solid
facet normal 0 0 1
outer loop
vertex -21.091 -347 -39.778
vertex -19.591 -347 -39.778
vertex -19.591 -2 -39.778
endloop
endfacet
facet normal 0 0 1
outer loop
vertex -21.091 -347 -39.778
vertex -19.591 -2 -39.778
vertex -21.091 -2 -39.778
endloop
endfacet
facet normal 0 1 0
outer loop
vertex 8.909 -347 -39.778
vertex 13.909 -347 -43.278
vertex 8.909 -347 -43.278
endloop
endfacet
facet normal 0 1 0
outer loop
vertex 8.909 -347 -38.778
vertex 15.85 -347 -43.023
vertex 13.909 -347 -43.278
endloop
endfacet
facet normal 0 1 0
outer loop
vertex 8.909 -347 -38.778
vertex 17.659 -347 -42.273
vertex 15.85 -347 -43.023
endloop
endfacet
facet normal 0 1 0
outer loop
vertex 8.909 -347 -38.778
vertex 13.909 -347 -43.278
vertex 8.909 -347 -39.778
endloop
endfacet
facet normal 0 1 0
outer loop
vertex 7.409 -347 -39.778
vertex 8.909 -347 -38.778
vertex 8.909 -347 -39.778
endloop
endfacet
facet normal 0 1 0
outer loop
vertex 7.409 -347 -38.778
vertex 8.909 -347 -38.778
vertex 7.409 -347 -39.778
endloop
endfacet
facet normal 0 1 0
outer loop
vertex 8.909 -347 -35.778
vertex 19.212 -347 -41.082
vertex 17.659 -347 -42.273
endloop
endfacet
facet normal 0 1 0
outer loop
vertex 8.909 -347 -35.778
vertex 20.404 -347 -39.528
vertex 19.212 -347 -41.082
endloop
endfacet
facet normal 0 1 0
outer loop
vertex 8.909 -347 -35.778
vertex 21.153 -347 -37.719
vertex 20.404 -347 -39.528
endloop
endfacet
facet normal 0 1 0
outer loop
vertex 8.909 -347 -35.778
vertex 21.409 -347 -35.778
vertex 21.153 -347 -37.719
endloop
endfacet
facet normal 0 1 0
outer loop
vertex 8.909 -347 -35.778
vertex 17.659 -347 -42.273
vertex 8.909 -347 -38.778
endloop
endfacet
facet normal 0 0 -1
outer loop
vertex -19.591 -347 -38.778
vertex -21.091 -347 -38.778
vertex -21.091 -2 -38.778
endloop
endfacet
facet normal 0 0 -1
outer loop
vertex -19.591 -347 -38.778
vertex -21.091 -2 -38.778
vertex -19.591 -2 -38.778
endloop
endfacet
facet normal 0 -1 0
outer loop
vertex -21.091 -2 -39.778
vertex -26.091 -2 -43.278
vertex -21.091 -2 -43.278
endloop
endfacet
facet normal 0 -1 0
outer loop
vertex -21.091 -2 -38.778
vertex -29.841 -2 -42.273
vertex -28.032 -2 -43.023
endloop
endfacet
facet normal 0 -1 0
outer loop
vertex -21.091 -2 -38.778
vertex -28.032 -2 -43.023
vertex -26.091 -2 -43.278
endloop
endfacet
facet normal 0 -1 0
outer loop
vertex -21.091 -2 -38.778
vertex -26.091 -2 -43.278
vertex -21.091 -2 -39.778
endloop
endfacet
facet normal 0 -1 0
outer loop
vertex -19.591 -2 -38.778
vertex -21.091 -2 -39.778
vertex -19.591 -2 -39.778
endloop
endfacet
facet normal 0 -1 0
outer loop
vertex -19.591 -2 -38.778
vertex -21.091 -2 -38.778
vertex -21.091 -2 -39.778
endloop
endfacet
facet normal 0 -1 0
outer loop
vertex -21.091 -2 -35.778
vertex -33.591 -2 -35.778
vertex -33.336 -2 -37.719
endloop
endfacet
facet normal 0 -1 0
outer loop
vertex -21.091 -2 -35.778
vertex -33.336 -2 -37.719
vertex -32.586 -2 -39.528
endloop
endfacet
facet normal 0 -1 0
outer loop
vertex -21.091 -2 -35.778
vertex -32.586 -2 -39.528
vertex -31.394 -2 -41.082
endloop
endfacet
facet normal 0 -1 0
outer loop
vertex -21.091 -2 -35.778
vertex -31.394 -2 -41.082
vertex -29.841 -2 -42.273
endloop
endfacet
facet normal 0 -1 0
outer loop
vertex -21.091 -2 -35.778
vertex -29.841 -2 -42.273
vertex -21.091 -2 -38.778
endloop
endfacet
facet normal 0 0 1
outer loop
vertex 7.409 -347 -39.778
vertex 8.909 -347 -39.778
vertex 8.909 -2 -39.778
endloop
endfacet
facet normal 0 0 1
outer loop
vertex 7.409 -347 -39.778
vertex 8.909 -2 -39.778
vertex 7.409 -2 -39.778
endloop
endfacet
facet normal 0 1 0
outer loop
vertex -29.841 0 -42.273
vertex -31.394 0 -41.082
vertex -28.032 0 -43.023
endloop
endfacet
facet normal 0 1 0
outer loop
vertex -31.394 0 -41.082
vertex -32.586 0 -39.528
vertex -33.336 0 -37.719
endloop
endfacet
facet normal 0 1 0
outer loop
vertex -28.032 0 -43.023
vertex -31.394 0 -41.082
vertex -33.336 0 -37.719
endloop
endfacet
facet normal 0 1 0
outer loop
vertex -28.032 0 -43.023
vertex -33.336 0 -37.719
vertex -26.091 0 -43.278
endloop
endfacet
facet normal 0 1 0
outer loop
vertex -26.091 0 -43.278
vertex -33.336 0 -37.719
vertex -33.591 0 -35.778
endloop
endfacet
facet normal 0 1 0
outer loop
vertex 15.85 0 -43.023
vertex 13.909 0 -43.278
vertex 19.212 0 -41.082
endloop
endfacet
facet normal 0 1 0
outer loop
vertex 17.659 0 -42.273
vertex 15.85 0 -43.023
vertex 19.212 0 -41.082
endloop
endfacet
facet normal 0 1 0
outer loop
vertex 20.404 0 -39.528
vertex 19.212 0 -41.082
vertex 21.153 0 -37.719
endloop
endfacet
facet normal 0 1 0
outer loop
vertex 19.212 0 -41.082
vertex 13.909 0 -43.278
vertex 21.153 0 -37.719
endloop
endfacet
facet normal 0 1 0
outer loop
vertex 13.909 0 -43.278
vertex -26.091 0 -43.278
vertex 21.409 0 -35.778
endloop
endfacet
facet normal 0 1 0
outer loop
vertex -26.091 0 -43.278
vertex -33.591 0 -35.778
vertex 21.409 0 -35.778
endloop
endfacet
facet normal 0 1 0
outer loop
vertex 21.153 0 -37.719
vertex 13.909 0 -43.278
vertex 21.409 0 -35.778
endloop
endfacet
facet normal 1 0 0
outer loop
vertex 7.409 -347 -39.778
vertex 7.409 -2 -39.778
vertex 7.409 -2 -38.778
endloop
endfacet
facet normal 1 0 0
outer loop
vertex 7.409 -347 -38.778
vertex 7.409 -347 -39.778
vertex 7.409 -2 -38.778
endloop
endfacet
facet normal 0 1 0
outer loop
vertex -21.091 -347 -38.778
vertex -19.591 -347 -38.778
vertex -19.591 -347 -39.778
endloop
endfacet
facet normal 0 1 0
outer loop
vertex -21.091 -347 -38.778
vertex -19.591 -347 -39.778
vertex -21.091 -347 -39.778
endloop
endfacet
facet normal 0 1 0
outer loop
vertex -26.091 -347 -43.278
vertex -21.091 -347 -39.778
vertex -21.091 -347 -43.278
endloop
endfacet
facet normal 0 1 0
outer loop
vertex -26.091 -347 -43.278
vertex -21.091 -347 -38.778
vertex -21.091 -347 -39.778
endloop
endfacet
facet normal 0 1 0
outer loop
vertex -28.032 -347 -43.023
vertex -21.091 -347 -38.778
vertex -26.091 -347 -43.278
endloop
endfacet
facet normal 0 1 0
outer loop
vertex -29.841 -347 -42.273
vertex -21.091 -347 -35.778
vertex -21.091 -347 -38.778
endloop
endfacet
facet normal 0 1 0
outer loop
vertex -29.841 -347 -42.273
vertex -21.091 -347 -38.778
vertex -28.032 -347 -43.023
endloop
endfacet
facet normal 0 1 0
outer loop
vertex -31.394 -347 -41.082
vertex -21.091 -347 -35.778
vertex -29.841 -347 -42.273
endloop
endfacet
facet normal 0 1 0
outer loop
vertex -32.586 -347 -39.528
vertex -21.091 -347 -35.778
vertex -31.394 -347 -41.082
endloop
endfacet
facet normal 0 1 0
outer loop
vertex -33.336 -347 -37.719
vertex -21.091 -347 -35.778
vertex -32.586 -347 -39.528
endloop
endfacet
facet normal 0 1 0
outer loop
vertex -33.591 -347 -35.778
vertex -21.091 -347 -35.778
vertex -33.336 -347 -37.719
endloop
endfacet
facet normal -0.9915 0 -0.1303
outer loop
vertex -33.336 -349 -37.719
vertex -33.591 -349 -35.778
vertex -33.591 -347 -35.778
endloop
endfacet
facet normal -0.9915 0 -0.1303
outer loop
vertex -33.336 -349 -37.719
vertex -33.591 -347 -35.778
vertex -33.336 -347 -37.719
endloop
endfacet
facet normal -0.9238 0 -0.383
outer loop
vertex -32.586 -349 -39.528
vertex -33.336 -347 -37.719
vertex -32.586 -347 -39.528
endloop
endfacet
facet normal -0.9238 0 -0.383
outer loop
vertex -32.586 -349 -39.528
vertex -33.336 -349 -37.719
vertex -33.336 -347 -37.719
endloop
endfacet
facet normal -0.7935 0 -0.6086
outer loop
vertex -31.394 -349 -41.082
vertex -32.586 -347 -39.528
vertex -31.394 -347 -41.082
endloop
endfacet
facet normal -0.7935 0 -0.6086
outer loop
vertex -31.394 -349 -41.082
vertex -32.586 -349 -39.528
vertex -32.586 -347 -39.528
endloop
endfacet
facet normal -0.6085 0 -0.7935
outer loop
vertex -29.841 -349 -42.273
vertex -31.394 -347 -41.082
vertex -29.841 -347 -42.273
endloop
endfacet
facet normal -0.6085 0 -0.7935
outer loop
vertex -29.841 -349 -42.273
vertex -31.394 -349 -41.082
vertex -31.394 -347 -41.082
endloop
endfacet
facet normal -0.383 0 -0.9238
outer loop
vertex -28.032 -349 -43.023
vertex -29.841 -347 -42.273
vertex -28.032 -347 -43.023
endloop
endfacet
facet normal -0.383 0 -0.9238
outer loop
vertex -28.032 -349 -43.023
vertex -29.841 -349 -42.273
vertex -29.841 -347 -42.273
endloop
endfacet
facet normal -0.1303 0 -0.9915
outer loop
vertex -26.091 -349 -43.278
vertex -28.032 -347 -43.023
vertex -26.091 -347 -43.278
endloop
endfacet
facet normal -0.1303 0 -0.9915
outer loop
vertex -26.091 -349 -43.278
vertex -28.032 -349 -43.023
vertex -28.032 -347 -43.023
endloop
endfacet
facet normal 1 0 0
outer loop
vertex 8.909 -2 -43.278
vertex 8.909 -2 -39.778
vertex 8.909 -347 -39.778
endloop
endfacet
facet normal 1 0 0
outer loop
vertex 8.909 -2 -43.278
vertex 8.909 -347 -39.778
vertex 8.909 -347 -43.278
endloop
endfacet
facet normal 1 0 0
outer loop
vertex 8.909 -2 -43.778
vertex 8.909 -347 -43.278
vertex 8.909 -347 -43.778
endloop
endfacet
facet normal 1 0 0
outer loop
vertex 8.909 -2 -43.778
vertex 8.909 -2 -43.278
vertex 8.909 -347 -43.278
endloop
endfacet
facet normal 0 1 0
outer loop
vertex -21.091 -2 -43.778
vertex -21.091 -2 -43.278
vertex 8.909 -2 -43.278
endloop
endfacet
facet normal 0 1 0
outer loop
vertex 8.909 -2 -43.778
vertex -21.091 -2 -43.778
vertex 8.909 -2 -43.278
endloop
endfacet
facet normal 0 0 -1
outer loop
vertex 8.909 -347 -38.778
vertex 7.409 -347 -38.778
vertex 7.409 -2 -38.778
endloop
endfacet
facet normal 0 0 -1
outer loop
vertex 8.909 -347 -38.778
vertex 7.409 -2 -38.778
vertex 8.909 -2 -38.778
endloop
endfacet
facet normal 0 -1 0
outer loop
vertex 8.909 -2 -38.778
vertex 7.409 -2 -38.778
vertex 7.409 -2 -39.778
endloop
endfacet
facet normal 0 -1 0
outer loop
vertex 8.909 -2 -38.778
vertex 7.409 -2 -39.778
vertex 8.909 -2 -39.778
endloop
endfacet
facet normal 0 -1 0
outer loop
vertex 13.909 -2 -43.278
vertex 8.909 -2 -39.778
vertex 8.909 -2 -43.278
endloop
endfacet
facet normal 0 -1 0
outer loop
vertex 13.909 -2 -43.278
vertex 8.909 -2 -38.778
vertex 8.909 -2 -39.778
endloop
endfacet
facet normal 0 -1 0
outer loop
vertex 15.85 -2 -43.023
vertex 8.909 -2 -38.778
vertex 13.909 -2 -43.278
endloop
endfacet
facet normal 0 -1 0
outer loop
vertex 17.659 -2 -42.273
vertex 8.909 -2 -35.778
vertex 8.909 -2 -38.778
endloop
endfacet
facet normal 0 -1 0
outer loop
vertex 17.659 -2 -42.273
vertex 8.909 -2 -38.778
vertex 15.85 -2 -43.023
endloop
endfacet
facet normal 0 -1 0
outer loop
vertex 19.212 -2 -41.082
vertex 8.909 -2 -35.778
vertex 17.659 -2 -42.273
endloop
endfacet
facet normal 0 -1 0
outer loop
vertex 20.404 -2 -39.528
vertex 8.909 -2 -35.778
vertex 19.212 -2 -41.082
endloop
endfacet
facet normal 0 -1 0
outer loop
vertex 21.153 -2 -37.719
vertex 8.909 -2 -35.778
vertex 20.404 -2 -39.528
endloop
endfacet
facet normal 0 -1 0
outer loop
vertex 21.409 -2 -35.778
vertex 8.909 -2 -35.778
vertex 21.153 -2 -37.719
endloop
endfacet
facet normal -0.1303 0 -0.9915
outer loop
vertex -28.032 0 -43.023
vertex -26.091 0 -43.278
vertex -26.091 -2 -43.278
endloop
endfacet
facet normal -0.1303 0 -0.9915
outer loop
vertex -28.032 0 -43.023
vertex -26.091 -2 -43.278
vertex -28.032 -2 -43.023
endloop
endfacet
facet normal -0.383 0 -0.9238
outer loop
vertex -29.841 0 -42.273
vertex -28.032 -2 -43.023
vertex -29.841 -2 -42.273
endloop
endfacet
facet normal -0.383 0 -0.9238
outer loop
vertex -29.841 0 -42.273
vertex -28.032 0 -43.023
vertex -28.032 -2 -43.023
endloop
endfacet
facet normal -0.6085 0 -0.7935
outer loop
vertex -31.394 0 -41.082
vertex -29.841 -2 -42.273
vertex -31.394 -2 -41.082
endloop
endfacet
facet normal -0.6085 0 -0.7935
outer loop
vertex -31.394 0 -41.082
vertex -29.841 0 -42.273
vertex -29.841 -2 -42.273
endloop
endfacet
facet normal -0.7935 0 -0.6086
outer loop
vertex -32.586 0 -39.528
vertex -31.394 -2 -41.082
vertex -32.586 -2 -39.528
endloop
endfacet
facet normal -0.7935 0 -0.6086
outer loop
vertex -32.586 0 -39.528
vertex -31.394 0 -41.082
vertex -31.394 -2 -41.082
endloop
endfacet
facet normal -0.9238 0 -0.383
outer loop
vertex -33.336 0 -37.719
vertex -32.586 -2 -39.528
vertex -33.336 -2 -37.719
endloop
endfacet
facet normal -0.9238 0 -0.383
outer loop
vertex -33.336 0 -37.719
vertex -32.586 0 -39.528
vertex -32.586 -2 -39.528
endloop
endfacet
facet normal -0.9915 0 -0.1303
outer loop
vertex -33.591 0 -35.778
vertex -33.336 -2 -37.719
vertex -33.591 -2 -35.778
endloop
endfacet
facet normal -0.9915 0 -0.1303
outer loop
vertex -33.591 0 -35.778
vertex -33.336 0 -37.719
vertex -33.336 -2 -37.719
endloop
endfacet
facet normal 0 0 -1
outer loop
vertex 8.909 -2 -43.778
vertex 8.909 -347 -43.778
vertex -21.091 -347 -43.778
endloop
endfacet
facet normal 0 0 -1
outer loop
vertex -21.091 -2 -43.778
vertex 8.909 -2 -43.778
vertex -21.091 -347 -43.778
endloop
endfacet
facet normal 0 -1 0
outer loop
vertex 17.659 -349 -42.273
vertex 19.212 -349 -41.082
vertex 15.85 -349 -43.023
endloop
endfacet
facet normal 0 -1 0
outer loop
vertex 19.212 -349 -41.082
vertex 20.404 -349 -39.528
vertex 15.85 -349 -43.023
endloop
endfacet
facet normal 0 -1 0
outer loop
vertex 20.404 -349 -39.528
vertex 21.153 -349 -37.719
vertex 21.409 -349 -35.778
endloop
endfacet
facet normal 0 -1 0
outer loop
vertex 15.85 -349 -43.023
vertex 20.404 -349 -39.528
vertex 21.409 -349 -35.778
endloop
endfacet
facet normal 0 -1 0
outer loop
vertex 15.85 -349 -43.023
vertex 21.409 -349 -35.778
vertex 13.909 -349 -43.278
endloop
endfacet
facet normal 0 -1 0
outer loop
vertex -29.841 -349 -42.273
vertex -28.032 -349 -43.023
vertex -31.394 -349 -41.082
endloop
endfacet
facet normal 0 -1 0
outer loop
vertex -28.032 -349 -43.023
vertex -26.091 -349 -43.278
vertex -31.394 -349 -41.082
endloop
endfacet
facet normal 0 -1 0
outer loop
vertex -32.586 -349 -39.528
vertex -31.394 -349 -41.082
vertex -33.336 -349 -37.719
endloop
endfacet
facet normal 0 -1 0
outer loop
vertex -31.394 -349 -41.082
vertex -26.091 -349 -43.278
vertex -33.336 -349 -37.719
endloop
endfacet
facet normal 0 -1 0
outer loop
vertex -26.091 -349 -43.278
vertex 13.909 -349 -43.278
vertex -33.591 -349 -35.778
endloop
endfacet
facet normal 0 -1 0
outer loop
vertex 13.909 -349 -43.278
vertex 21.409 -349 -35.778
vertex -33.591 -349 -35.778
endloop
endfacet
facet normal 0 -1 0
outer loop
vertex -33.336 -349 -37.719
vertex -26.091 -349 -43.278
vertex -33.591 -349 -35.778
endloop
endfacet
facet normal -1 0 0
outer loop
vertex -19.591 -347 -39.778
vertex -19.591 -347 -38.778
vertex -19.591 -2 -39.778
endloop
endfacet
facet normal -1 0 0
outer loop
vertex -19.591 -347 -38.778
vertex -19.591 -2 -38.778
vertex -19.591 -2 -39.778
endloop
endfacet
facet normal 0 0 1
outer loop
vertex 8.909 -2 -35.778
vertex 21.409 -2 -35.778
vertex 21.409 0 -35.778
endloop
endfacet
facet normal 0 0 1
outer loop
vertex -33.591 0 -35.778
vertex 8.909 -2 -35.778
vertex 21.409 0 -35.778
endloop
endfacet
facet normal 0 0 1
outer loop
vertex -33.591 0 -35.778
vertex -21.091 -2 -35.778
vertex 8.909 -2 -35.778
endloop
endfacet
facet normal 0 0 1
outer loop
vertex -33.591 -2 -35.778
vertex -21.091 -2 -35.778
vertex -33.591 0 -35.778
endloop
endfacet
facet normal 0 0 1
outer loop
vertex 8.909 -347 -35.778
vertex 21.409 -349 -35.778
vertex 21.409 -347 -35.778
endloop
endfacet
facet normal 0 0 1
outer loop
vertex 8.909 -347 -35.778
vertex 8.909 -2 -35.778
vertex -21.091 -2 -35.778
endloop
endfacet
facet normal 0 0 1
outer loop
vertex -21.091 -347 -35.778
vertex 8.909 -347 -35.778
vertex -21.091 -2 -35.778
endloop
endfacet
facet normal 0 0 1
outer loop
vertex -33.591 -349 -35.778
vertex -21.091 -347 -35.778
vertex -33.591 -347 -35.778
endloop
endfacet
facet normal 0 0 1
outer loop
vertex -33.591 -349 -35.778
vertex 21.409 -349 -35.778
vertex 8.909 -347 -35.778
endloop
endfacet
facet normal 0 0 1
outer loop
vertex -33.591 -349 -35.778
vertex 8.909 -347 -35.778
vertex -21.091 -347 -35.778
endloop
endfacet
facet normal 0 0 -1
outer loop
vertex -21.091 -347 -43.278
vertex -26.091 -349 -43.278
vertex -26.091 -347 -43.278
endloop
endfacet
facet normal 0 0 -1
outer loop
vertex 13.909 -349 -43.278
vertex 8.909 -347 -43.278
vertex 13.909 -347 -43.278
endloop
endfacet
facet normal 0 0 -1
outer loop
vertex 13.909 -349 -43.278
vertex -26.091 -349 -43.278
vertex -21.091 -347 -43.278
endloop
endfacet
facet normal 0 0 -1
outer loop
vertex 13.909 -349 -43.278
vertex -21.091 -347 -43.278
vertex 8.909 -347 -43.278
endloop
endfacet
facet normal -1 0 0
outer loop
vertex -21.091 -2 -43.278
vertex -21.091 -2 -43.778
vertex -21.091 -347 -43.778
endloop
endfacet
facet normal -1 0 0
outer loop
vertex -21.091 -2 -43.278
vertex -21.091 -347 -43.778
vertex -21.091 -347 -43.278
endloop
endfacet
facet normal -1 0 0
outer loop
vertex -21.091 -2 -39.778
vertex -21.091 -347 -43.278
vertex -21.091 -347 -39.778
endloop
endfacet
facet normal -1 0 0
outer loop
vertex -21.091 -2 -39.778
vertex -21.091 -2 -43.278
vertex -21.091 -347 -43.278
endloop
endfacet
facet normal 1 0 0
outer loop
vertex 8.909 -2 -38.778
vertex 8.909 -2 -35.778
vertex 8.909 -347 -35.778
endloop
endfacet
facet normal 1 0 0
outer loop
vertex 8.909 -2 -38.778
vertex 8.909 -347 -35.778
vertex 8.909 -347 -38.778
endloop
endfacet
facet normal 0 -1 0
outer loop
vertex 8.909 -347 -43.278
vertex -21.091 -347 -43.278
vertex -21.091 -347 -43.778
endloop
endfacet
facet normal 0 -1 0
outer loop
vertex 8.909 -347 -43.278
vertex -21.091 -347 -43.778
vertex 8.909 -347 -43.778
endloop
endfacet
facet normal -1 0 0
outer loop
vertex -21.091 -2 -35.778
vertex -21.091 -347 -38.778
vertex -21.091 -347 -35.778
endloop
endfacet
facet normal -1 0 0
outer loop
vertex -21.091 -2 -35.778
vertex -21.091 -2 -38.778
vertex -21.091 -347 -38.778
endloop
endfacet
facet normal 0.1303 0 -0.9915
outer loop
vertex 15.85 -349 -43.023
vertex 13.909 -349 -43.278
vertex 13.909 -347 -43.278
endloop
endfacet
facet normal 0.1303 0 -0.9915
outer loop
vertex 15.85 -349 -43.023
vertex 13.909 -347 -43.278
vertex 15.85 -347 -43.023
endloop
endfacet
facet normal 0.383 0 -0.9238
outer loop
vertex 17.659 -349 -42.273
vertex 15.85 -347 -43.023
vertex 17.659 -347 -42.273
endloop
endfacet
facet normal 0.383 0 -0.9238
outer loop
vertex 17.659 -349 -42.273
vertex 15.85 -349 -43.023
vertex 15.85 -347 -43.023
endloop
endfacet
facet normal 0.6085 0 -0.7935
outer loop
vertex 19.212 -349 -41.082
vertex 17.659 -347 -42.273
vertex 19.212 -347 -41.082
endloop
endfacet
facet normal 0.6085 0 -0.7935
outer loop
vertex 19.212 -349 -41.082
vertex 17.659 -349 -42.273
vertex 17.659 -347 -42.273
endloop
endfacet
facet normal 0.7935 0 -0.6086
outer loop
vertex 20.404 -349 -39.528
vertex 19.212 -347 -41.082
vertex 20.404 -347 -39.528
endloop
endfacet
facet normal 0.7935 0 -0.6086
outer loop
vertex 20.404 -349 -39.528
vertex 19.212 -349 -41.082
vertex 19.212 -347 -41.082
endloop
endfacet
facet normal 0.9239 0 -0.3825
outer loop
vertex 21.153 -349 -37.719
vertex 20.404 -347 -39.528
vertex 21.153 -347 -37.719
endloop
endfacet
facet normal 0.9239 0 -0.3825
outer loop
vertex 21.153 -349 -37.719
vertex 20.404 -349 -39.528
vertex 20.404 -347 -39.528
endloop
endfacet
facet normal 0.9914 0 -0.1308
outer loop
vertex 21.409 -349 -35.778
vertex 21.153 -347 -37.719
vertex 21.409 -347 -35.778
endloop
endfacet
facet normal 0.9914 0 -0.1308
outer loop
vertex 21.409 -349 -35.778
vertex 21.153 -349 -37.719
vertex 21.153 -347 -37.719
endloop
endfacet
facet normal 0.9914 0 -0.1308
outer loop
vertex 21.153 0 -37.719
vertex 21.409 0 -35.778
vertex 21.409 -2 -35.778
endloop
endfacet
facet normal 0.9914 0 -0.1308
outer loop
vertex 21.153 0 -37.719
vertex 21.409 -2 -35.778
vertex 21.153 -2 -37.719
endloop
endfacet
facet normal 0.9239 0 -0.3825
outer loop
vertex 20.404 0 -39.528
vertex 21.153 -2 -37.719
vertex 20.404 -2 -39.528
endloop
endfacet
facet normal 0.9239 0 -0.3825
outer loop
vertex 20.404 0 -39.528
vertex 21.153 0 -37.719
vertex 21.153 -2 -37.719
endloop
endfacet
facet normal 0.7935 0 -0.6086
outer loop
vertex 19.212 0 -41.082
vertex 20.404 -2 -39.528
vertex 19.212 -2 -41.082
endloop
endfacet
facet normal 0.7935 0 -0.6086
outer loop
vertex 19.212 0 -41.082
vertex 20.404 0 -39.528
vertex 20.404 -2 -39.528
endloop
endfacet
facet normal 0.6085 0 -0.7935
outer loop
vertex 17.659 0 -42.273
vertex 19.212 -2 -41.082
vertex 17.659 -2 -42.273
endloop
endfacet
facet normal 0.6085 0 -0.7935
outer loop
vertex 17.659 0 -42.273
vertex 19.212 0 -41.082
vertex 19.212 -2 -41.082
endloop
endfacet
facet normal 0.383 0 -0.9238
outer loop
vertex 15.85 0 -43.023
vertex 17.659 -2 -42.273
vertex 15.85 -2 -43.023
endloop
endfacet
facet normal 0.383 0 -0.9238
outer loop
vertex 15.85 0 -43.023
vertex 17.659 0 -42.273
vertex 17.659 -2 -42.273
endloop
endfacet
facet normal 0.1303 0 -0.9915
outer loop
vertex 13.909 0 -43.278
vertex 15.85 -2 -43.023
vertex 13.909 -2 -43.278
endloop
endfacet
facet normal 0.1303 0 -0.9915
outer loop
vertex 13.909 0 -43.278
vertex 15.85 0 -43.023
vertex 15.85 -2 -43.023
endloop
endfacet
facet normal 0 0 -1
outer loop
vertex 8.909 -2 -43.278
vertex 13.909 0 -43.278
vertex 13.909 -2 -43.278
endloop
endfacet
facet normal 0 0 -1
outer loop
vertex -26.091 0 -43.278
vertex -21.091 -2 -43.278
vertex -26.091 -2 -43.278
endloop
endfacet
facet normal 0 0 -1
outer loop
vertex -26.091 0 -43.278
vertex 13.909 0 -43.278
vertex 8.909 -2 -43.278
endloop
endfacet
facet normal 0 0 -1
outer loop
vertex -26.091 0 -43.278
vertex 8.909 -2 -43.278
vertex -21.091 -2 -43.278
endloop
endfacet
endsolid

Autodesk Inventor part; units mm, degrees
ref_plane "YZ Plane" through (0, 0, 0) normal (1, 0, 0) x (0, 1, 0)
ref_plane "XZ Plane" through (0, 0, 0) normal (0, 1, 0) x (-1, 0, 0)
ref_plane "XY Plane" through (0, 0, 0) normal (0, 0, 1) x (1, 0, 0)
ref_plane "工作平面1" through (0, 0, 0) normal (0, -1, 0) x (1, 0, 0)
sketch "草图2" plane through (0, 0, 0) normal (0, -1, 0) x (1, 0, 0)
  line L0 (13.9089, -43.2782) -> (-26.0911, -43.2782) projected
  arc A0 (13.9089, -43.2782) -> (21.4089, -35.7782) centre (13.9089, -35.7782) ccw projected
  line L1 (-33.5911, -35.7782) -> (21.4089, -35.7782) projected
  arc A1 (-33.5911, -35.7782) -> (-26.0911, -43.2782) centre (-26.0911, -35.7782) ccw projected
  point P0 (0, 0)
extrude "拉伸2" add sketch "草图2" along normal blind 2
ref_plane "工作平面2" through (-1.2405, 0, -40.1772) normal (0, -1, 0) x (1, 0, 0)
sketch "草图3" plane through (0, -2, 0) normal (0, -1, 0) x (1, 0, 0)
  line L0 (-21.0911, -35.7782) -> (8.9089, -35.7782)
  line L1 (8.9089, -35.7782) -> (8.9089, -43.7782)
  line L2 (8.9089, -43.7782) -> (-21.0911, -43.7782)
  line L3 (21.4089, -35.7782) -> (-33.5911, -35.7782) projected
  line L4 (-21.0911, -38.7782) -> (-19.5911, -38.7782)
  line L5 (-19.5911, -38.7782) -> (-19.5911, -39.7782)
  line L6 (-19.5911, -39.7782) -> (-21.0911, -39.7782)
  line L7 (-21.0911, -43.7782) -> (-21.0911, -39.7782)
  line L8 (-21.0911, -38.7782) -> (-21.0911, -35.7782)
  line L9 (8.9089, -39.7782) -> (7.4089, -39.7782)
  line L10 (7.4089, -39.7782) -> (7.4089, -38.7782)
  line L11 (7.4089, -38.7782) -> (8.9089, -38.7782)
  line L12 (8.9089, -38.7782) -> (8.9089, -39.7782)
  point P0 (0, 0)
  dimension "d7" = 8
  dimension "d8" = 1
  dimension "d9" = 3
  dimension "d10" = 1.5
  dimension "d11" = 1.5
extrude "拉伸3" add sketch "草图3" along normal blind 345 contours L0 L1 L11 L10 L9 L2 L7 L6 L5 L4 L8
ref_plane "工作平面3" through (0, -174.5, 0) normal (0, -1, 0) x (1, 0, 0)
mirror "镜像1" about plane through (0, -174.5, 0) normal (0, -1, 0) of "拉伸2"
properties part number "导轨"
